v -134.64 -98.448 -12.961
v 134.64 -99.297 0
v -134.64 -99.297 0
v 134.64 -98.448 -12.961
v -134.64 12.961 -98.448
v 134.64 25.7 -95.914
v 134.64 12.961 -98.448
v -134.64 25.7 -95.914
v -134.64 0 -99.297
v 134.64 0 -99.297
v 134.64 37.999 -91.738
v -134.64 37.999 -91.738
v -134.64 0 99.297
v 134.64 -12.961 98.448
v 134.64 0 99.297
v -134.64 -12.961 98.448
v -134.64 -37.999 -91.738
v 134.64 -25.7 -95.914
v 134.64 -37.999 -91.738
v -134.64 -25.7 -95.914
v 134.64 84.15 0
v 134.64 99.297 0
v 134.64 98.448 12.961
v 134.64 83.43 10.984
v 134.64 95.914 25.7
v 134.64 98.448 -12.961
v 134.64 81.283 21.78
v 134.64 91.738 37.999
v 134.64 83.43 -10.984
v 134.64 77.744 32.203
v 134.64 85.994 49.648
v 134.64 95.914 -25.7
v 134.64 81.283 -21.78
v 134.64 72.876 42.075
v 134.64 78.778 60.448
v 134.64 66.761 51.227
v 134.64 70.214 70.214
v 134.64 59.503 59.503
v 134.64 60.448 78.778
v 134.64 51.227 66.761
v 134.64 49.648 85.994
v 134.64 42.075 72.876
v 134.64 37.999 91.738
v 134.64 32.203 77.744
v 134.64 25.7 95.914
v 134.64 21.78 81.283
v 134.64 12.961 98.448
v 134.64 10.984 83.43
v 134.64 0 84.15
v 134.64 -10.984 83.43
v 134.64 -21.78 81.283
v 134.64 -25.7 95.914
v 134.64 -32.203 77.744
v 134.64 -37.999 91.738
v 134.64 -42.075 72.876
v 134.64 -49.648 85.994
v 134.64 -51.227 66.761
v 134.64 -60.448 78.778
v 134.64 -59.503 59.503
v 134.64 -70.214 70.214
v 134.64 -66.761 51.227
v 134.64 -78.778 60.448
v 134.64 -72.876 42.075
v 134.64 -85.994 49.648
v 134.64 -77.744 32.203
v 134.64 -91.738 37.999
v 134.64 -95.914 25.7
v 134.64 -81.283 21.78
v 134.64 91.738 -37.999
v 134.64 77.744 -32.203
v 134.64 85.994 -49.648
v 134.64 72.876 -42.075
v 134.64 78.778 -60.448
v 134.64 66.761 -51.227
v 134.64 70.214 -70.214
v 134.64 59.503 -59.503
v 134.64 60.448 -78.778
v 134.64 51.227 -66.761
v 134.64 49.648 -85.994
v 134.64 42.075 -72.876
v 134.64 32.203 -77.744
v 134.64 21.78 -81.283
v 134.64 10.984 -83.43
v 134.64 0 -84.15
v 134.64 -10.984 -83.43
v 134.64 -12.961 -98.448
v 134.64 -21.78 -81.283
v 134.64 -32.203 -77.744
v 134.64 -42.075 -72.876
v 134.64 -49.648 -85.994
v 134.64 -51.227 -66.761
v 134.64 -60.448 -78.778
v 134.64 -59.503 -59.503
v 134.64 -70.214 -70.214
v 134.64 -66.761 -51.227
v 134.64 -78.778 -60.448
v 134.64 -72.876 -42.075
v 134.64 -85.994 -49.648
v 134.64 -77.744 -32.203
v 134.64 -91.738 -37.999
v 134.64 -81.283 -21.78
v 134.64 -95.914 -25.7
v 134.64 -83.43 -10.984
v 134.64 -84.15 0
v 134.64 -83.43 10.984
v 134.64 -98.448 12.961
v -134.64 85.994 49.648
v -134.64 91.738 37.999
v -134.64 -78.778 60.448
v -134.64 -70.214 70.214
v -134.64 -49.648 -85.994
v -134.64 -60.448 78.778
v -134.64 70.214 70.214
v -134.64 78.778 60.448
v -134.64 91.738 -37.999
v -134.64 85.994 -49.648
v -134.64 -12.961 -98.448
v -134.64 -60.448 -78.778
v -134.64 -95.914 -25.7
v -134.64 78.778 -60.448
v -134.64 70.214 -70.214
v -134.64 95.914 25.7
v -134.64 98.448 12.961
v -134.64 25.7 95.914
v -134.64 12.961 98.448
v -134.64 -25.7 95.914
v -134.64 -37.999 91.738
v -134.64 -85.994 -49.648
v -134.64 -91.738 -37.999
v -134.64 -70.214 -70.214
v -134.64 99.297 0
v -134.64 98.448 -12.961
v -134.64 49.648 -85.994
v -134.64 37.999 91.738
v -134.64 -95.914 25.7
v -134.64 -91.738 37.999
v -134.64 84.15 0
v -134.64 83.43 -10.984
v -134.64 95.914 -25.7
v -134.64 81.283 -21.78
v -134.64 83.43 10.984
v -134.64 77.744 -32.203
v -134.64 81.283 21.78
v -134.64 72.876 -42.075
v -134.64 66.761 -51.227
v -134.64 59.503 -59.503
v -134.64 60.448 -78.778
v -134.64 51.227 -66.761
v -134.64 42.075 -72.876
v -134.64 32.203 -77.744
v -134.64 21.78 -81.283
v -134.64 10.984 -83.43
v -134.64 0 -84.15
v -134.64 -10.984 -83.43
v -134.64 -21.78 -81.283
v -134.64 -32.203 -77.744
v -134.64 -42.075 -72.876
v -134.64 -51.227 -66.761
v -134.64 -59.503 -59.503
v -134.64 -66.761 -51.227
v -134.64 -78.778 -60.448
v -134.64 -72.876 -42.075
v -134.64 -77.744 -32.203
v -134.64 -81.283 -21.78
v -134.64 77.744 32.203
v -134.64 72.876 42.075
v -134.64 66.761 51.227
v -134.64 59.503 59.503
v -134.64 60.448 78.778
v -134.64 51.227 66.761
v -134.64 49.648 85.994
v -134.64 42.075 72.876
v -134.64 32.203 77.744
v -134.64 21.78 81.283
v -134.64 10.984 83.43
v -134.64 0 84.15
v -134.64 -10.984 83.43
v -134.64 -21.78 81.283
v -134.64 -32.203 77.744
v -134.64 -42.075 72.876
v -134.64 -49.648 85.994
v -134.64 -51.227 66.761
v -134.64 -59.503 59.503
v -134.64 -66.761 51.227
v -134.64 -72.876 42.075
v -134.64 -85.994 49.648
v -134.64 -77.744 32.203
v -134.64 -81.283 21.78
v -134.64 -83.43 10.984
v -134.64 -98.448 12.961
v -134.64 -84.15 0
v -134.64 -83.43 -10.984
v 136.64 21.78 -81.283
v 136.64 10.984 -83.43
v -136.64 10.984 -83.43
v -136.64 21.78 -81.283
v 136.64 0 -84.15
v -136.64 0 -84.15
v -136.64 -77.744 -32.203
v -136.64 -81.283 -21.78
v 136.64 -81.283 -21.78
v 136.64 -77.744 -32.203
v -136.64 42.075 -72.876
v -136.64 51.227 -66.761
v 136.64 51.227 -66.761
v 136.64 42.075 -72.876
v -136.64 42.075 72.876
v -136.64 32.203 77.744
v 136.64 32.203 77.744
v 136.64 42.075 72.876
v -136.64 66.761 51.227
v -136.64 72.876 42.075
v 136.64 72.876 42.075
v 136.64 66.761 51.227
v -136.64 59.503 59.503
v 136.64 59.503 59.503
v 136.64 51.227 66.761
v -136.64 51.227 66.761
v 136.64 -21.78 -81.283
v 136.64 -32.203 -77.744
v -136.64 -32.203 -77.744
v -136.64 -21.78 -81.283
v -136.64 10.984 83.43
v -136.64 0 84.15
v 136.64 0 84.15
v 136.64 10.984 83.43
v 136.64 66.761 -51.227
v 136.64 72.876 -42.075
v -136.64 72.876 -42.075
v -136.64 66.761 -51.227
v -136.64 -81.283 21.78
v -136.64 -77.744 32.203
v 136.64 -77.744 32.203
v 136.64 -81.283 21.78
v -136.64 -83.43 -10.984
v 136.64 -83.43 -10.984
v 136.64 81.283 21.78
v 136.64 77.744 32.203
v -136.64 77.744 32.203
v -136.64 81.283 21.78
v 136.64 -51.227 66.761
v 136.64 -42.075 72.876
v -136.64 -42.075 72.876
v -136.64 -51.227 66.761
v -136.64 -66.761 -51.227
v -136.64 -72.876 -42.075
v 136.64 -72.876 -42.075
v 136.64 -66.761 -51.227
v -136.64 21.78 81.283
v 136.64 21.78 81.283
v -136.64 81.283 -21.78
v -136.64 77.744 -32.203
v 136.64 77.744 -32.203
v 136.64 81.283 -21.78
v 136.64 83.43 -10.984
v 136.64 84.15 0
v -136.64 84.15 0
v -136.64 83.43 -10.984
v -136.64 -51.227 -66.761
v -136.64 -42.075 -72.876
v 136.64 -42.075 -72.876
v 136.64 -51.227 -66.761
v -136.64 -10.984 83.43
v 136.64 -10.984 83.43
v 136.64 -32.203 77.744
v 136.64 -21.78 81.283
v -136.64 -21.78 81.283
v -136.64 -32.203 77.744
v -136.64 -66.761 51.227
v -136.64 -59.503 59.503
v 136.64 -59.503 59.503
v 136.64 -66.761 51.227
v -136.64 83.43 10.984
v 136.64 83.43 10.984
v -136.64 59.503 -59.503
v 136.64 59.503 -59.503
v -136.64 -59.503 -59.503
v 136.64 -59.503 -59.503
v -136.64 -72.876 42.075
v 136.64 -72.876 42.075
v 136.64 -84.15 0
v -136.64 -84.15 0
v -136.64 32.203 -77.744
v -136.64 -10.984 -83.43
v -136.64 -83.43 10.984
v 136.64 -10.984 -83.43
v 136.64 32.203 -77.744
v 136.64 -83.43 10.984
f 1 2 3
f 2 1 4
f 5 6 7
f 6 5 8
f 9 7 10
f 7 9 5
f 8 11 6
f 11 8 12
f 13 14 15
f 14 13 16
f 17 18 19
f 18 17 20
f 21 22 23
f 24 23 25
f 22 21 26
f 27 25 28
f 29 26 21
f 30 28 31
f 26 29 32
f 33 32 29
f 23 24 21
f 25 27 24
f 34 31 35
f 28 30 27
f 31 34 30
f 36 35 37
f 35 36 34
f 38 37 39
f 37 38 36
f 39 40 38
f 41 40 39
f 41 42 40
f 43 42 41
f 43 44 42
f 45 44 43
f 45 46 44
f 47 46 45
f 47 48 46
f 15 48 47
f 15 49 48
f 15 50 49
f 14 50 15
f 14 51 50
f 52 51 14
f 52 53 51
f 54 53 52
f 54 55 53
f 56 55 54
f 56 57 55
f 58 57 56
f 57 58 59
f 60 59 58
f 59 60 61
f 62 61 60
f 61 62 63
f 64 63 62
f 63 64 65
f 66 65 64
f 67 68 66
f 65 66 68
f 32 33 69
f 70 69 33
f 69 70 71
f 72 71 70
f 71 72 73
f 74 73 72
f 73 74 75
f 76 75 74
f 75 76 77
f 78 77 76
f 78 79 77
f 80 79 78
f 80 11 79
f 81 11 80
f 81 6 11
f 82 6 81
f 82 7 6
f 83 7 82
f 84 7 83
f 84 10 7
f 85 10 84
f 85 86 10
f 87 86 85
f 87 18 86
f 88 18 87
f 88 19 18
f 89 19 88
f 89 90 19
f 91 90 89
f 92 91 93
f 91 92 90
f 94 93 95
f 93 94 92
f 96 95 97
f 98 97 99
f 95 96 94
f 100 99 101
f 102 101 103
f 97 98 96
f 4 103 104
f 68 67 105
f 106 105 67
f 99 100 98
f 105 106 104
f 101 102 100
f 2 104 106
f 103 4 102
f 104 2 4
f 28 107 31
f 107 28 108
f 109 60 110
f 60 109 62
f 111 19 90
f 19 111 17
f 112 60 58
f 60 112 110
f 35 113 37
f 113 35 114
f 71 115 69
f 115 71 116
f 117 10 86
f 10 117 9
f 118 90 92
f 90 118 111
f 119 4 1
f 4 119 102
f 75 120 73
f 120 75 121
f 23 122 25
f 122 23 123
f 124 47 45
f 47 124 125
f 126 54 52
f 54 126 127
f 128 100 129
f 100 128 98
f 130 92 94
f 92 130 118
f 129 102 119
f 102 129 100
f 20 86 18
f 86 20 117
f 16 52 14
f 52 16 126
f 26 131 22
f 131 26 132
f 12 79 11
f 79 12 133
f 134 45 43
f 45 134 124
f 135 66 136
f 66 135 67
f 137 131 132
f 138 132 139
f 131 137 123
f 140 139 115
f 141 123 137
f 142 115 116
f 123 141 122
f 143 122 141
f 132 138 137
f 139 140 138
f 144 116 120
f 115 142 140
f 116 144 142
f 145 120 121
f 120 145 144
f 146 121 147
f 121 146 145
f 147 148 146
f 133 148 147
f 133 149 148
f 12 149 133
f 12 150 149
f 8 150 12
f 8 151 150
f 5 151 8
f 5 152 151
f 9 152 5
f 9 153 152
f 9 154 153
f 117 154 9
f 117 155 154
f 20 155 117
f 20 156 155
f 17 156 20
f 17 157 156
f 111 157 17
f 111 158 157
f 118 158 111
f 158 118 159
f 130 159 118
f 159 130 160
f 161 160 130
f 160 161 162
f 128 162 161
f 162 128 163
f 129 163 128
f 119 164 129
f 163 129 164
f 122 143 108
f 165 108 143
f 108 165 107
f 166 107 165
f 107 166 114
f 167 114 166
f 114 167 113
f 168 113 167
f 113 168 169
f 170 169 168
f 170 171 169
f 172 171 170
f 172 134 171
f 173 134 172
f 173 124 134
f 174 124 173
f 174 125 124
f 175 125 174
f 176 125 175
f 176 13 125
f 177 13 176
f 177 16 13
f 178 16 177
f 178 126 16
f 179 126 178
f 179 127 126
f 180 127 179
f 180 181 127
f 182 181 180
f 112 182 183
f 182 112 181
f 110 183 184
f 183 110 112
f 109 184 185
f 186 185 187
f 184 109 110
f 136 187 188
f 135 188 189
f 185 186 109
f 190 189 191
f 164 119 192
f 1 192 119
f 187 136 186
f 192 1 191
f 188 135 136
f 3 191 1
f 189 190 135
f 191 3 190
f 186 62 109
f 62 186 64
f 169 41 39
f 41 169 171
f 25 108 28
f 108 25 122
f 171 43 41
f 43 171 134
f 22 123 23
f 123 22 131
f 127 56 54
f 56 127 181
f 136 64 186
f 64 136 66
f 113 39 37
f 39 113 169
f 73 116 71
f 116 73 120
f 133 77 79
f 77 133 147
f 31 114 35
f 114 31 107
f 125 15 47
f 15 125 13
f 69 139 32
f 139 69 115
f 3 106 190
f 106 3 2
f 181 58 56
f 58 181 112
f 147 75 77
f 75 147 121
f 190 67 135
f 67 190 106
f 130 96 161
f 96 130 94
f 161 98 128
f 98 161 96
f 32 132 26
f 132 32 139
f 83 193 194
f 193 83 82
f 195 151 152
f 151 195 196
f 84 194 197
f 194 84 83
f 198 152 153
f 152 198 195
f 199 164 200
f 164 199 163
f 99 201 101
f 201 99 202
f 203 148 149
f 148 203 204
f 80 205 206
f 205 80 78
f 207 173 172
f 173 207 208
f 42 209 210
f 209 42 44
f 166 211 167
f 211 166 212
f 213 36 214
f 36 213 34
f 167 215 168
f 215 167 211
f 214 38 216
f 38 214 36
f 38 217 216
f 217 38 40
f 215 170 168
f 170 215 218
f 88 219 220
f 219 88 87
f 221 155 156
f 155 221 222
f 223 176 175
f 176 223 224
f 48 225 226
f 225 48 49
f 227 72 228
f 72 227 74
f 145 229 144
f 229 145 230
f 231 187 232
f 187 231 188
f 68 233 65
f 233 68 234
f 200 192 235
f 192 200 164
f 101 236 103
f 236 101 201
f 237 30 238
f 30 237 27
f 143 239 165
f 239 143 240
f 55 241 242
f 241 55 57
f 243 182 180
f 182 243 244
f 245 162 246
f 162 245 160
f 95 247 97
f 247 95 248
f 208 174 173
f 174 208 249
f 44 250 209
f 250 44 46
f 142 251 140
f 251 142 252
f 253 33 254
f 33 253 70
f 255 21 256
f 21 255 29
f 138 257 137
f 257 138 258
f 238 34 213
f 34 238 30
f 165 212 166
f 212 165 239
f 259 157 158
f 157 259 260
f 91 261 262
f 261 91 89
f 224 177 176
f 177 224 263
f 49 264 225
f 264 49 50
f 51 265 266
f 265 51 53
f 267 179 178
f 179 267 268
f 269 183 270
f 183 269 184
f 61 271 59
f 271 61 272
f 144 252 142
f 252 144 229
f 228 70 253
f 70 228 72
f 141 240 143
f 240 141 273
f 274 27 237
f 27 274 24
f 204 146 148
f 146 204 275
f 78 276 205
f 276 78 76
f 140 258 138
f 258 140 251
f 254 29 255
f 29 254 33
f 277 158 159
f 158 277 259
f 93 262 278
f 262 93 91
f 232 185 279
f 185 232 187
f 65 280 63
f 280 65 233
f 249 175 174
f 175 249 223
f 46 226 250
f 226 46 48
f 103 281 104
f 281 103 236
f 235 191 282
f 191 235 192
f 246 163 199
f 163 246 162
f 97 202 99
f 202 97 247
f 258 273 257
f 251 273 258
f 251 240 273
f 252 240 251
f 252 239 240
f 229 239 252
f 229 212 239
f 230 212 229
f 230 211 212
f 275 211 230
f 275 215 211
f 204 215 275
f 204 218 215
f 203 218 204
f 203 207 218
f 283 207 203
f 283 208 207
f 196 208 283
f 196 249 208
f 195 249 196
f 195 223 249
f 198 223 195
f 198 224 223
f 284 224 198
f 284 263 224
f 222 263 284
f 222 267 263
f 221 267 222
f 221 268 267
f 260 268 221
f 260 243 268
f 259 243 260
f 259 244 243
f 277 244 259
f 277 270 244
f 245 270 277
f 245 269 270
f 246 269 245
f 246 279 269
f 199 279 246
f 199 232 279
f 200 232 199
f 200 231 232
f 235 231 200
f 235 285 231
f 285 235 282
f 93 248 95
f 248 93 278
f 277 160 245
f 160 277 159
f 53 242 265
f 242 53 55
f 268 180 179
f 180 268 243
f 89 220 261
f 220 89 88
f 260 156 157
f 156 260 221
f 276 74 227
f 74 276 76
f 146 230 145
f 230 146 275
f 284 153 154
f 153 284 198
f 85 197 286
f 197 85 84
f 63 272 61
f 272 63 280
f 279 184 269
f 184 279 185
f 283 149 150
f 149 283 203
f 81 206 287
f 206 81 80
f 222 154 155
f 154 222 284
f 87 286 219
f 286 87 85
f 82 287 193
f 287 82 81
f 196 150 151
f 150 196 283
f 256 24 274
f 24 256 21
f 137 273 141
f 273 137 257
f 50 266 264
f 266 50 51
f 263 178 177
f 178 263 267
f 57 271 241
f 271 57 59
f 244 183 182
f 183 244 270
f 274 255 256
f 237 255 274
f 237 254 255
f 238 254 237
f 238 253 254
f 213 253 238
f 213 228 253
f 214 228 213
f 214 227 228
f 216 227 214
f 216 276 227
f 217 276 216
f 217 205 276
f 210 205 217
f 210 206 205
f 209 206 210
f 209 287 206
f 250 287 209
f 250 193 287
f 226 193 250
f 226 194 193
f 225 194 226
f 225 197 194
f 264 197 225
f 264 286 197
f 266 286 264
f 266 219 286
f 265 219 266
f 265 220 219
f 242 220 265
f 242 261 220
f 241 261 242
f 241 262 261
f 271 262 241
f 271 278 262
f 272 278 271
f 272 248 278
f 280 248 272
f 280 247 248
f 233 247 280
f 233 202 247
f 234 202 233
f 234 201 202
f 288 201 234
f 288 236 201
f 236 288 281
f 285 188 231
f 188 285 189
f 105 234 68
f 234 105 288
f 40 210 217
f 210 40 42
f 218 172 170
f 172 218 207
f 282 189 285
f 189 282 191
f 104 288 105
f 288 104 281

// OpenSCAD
// Auto-generated by scripts/author_from_manifest.py (Phase D.3).
// Source: data/phase_d_manifest.json (sku_intent='victaulic-005-rigid-coupling-6in').
// Do not hand-edit — regenerate from the manifest.
//
// @part victaulic_005_rigid_coupling_6in
// @kind fitting
// @category fitting.coupling
// @display-name "Victaulic FireLock Style 005 Rigid Coupling 6\""
// @mfg victaulic
// @mfg-pn Style_005_6in
// @listing UL FM
// @price-usd 48.00
// @install-minutes 6
// @crew journeyman
// @param size_in number default=6 label="Size" unit="in"
// @port inlet position=[-0.05,0,0] direction=[-1,0,0] style=grooved size_in=6 role=run_a
// @port outlet position=[0.05,0,0] direction=[1,0,0] style=grooved size_in=6 role=run_b

size_in = 6.0;

function od_mm(nps) =
    nps ==   1  ? 33.4 :
    nps == 1.25 ? 42.2 :
    nps == 1.5  ? 48.3 :
    nps ==   2  ? 60.3 :
    nps == 2.5  ? 73.0 :
    nps ==   3  ? 88.9 :
    nps ==   4  ? 114.3 :
    nps ==   5  ? 141.3 :
    nps ==   6  ? 168.3 :
    nps ==   8  ? 219.1 :
    nps ==  10  ? 273.0 : 60.3;

od = od_mm(size_in);
len_mm = od * 1.6;

rotate([0, 90, 0])
    union() {
        cylinder(h = len_mm, d = od * 1.18, center = true, $fn = 48);
        cylinder(h = len_mm + 4, d = od, center = true, $fn = 48);
    }
